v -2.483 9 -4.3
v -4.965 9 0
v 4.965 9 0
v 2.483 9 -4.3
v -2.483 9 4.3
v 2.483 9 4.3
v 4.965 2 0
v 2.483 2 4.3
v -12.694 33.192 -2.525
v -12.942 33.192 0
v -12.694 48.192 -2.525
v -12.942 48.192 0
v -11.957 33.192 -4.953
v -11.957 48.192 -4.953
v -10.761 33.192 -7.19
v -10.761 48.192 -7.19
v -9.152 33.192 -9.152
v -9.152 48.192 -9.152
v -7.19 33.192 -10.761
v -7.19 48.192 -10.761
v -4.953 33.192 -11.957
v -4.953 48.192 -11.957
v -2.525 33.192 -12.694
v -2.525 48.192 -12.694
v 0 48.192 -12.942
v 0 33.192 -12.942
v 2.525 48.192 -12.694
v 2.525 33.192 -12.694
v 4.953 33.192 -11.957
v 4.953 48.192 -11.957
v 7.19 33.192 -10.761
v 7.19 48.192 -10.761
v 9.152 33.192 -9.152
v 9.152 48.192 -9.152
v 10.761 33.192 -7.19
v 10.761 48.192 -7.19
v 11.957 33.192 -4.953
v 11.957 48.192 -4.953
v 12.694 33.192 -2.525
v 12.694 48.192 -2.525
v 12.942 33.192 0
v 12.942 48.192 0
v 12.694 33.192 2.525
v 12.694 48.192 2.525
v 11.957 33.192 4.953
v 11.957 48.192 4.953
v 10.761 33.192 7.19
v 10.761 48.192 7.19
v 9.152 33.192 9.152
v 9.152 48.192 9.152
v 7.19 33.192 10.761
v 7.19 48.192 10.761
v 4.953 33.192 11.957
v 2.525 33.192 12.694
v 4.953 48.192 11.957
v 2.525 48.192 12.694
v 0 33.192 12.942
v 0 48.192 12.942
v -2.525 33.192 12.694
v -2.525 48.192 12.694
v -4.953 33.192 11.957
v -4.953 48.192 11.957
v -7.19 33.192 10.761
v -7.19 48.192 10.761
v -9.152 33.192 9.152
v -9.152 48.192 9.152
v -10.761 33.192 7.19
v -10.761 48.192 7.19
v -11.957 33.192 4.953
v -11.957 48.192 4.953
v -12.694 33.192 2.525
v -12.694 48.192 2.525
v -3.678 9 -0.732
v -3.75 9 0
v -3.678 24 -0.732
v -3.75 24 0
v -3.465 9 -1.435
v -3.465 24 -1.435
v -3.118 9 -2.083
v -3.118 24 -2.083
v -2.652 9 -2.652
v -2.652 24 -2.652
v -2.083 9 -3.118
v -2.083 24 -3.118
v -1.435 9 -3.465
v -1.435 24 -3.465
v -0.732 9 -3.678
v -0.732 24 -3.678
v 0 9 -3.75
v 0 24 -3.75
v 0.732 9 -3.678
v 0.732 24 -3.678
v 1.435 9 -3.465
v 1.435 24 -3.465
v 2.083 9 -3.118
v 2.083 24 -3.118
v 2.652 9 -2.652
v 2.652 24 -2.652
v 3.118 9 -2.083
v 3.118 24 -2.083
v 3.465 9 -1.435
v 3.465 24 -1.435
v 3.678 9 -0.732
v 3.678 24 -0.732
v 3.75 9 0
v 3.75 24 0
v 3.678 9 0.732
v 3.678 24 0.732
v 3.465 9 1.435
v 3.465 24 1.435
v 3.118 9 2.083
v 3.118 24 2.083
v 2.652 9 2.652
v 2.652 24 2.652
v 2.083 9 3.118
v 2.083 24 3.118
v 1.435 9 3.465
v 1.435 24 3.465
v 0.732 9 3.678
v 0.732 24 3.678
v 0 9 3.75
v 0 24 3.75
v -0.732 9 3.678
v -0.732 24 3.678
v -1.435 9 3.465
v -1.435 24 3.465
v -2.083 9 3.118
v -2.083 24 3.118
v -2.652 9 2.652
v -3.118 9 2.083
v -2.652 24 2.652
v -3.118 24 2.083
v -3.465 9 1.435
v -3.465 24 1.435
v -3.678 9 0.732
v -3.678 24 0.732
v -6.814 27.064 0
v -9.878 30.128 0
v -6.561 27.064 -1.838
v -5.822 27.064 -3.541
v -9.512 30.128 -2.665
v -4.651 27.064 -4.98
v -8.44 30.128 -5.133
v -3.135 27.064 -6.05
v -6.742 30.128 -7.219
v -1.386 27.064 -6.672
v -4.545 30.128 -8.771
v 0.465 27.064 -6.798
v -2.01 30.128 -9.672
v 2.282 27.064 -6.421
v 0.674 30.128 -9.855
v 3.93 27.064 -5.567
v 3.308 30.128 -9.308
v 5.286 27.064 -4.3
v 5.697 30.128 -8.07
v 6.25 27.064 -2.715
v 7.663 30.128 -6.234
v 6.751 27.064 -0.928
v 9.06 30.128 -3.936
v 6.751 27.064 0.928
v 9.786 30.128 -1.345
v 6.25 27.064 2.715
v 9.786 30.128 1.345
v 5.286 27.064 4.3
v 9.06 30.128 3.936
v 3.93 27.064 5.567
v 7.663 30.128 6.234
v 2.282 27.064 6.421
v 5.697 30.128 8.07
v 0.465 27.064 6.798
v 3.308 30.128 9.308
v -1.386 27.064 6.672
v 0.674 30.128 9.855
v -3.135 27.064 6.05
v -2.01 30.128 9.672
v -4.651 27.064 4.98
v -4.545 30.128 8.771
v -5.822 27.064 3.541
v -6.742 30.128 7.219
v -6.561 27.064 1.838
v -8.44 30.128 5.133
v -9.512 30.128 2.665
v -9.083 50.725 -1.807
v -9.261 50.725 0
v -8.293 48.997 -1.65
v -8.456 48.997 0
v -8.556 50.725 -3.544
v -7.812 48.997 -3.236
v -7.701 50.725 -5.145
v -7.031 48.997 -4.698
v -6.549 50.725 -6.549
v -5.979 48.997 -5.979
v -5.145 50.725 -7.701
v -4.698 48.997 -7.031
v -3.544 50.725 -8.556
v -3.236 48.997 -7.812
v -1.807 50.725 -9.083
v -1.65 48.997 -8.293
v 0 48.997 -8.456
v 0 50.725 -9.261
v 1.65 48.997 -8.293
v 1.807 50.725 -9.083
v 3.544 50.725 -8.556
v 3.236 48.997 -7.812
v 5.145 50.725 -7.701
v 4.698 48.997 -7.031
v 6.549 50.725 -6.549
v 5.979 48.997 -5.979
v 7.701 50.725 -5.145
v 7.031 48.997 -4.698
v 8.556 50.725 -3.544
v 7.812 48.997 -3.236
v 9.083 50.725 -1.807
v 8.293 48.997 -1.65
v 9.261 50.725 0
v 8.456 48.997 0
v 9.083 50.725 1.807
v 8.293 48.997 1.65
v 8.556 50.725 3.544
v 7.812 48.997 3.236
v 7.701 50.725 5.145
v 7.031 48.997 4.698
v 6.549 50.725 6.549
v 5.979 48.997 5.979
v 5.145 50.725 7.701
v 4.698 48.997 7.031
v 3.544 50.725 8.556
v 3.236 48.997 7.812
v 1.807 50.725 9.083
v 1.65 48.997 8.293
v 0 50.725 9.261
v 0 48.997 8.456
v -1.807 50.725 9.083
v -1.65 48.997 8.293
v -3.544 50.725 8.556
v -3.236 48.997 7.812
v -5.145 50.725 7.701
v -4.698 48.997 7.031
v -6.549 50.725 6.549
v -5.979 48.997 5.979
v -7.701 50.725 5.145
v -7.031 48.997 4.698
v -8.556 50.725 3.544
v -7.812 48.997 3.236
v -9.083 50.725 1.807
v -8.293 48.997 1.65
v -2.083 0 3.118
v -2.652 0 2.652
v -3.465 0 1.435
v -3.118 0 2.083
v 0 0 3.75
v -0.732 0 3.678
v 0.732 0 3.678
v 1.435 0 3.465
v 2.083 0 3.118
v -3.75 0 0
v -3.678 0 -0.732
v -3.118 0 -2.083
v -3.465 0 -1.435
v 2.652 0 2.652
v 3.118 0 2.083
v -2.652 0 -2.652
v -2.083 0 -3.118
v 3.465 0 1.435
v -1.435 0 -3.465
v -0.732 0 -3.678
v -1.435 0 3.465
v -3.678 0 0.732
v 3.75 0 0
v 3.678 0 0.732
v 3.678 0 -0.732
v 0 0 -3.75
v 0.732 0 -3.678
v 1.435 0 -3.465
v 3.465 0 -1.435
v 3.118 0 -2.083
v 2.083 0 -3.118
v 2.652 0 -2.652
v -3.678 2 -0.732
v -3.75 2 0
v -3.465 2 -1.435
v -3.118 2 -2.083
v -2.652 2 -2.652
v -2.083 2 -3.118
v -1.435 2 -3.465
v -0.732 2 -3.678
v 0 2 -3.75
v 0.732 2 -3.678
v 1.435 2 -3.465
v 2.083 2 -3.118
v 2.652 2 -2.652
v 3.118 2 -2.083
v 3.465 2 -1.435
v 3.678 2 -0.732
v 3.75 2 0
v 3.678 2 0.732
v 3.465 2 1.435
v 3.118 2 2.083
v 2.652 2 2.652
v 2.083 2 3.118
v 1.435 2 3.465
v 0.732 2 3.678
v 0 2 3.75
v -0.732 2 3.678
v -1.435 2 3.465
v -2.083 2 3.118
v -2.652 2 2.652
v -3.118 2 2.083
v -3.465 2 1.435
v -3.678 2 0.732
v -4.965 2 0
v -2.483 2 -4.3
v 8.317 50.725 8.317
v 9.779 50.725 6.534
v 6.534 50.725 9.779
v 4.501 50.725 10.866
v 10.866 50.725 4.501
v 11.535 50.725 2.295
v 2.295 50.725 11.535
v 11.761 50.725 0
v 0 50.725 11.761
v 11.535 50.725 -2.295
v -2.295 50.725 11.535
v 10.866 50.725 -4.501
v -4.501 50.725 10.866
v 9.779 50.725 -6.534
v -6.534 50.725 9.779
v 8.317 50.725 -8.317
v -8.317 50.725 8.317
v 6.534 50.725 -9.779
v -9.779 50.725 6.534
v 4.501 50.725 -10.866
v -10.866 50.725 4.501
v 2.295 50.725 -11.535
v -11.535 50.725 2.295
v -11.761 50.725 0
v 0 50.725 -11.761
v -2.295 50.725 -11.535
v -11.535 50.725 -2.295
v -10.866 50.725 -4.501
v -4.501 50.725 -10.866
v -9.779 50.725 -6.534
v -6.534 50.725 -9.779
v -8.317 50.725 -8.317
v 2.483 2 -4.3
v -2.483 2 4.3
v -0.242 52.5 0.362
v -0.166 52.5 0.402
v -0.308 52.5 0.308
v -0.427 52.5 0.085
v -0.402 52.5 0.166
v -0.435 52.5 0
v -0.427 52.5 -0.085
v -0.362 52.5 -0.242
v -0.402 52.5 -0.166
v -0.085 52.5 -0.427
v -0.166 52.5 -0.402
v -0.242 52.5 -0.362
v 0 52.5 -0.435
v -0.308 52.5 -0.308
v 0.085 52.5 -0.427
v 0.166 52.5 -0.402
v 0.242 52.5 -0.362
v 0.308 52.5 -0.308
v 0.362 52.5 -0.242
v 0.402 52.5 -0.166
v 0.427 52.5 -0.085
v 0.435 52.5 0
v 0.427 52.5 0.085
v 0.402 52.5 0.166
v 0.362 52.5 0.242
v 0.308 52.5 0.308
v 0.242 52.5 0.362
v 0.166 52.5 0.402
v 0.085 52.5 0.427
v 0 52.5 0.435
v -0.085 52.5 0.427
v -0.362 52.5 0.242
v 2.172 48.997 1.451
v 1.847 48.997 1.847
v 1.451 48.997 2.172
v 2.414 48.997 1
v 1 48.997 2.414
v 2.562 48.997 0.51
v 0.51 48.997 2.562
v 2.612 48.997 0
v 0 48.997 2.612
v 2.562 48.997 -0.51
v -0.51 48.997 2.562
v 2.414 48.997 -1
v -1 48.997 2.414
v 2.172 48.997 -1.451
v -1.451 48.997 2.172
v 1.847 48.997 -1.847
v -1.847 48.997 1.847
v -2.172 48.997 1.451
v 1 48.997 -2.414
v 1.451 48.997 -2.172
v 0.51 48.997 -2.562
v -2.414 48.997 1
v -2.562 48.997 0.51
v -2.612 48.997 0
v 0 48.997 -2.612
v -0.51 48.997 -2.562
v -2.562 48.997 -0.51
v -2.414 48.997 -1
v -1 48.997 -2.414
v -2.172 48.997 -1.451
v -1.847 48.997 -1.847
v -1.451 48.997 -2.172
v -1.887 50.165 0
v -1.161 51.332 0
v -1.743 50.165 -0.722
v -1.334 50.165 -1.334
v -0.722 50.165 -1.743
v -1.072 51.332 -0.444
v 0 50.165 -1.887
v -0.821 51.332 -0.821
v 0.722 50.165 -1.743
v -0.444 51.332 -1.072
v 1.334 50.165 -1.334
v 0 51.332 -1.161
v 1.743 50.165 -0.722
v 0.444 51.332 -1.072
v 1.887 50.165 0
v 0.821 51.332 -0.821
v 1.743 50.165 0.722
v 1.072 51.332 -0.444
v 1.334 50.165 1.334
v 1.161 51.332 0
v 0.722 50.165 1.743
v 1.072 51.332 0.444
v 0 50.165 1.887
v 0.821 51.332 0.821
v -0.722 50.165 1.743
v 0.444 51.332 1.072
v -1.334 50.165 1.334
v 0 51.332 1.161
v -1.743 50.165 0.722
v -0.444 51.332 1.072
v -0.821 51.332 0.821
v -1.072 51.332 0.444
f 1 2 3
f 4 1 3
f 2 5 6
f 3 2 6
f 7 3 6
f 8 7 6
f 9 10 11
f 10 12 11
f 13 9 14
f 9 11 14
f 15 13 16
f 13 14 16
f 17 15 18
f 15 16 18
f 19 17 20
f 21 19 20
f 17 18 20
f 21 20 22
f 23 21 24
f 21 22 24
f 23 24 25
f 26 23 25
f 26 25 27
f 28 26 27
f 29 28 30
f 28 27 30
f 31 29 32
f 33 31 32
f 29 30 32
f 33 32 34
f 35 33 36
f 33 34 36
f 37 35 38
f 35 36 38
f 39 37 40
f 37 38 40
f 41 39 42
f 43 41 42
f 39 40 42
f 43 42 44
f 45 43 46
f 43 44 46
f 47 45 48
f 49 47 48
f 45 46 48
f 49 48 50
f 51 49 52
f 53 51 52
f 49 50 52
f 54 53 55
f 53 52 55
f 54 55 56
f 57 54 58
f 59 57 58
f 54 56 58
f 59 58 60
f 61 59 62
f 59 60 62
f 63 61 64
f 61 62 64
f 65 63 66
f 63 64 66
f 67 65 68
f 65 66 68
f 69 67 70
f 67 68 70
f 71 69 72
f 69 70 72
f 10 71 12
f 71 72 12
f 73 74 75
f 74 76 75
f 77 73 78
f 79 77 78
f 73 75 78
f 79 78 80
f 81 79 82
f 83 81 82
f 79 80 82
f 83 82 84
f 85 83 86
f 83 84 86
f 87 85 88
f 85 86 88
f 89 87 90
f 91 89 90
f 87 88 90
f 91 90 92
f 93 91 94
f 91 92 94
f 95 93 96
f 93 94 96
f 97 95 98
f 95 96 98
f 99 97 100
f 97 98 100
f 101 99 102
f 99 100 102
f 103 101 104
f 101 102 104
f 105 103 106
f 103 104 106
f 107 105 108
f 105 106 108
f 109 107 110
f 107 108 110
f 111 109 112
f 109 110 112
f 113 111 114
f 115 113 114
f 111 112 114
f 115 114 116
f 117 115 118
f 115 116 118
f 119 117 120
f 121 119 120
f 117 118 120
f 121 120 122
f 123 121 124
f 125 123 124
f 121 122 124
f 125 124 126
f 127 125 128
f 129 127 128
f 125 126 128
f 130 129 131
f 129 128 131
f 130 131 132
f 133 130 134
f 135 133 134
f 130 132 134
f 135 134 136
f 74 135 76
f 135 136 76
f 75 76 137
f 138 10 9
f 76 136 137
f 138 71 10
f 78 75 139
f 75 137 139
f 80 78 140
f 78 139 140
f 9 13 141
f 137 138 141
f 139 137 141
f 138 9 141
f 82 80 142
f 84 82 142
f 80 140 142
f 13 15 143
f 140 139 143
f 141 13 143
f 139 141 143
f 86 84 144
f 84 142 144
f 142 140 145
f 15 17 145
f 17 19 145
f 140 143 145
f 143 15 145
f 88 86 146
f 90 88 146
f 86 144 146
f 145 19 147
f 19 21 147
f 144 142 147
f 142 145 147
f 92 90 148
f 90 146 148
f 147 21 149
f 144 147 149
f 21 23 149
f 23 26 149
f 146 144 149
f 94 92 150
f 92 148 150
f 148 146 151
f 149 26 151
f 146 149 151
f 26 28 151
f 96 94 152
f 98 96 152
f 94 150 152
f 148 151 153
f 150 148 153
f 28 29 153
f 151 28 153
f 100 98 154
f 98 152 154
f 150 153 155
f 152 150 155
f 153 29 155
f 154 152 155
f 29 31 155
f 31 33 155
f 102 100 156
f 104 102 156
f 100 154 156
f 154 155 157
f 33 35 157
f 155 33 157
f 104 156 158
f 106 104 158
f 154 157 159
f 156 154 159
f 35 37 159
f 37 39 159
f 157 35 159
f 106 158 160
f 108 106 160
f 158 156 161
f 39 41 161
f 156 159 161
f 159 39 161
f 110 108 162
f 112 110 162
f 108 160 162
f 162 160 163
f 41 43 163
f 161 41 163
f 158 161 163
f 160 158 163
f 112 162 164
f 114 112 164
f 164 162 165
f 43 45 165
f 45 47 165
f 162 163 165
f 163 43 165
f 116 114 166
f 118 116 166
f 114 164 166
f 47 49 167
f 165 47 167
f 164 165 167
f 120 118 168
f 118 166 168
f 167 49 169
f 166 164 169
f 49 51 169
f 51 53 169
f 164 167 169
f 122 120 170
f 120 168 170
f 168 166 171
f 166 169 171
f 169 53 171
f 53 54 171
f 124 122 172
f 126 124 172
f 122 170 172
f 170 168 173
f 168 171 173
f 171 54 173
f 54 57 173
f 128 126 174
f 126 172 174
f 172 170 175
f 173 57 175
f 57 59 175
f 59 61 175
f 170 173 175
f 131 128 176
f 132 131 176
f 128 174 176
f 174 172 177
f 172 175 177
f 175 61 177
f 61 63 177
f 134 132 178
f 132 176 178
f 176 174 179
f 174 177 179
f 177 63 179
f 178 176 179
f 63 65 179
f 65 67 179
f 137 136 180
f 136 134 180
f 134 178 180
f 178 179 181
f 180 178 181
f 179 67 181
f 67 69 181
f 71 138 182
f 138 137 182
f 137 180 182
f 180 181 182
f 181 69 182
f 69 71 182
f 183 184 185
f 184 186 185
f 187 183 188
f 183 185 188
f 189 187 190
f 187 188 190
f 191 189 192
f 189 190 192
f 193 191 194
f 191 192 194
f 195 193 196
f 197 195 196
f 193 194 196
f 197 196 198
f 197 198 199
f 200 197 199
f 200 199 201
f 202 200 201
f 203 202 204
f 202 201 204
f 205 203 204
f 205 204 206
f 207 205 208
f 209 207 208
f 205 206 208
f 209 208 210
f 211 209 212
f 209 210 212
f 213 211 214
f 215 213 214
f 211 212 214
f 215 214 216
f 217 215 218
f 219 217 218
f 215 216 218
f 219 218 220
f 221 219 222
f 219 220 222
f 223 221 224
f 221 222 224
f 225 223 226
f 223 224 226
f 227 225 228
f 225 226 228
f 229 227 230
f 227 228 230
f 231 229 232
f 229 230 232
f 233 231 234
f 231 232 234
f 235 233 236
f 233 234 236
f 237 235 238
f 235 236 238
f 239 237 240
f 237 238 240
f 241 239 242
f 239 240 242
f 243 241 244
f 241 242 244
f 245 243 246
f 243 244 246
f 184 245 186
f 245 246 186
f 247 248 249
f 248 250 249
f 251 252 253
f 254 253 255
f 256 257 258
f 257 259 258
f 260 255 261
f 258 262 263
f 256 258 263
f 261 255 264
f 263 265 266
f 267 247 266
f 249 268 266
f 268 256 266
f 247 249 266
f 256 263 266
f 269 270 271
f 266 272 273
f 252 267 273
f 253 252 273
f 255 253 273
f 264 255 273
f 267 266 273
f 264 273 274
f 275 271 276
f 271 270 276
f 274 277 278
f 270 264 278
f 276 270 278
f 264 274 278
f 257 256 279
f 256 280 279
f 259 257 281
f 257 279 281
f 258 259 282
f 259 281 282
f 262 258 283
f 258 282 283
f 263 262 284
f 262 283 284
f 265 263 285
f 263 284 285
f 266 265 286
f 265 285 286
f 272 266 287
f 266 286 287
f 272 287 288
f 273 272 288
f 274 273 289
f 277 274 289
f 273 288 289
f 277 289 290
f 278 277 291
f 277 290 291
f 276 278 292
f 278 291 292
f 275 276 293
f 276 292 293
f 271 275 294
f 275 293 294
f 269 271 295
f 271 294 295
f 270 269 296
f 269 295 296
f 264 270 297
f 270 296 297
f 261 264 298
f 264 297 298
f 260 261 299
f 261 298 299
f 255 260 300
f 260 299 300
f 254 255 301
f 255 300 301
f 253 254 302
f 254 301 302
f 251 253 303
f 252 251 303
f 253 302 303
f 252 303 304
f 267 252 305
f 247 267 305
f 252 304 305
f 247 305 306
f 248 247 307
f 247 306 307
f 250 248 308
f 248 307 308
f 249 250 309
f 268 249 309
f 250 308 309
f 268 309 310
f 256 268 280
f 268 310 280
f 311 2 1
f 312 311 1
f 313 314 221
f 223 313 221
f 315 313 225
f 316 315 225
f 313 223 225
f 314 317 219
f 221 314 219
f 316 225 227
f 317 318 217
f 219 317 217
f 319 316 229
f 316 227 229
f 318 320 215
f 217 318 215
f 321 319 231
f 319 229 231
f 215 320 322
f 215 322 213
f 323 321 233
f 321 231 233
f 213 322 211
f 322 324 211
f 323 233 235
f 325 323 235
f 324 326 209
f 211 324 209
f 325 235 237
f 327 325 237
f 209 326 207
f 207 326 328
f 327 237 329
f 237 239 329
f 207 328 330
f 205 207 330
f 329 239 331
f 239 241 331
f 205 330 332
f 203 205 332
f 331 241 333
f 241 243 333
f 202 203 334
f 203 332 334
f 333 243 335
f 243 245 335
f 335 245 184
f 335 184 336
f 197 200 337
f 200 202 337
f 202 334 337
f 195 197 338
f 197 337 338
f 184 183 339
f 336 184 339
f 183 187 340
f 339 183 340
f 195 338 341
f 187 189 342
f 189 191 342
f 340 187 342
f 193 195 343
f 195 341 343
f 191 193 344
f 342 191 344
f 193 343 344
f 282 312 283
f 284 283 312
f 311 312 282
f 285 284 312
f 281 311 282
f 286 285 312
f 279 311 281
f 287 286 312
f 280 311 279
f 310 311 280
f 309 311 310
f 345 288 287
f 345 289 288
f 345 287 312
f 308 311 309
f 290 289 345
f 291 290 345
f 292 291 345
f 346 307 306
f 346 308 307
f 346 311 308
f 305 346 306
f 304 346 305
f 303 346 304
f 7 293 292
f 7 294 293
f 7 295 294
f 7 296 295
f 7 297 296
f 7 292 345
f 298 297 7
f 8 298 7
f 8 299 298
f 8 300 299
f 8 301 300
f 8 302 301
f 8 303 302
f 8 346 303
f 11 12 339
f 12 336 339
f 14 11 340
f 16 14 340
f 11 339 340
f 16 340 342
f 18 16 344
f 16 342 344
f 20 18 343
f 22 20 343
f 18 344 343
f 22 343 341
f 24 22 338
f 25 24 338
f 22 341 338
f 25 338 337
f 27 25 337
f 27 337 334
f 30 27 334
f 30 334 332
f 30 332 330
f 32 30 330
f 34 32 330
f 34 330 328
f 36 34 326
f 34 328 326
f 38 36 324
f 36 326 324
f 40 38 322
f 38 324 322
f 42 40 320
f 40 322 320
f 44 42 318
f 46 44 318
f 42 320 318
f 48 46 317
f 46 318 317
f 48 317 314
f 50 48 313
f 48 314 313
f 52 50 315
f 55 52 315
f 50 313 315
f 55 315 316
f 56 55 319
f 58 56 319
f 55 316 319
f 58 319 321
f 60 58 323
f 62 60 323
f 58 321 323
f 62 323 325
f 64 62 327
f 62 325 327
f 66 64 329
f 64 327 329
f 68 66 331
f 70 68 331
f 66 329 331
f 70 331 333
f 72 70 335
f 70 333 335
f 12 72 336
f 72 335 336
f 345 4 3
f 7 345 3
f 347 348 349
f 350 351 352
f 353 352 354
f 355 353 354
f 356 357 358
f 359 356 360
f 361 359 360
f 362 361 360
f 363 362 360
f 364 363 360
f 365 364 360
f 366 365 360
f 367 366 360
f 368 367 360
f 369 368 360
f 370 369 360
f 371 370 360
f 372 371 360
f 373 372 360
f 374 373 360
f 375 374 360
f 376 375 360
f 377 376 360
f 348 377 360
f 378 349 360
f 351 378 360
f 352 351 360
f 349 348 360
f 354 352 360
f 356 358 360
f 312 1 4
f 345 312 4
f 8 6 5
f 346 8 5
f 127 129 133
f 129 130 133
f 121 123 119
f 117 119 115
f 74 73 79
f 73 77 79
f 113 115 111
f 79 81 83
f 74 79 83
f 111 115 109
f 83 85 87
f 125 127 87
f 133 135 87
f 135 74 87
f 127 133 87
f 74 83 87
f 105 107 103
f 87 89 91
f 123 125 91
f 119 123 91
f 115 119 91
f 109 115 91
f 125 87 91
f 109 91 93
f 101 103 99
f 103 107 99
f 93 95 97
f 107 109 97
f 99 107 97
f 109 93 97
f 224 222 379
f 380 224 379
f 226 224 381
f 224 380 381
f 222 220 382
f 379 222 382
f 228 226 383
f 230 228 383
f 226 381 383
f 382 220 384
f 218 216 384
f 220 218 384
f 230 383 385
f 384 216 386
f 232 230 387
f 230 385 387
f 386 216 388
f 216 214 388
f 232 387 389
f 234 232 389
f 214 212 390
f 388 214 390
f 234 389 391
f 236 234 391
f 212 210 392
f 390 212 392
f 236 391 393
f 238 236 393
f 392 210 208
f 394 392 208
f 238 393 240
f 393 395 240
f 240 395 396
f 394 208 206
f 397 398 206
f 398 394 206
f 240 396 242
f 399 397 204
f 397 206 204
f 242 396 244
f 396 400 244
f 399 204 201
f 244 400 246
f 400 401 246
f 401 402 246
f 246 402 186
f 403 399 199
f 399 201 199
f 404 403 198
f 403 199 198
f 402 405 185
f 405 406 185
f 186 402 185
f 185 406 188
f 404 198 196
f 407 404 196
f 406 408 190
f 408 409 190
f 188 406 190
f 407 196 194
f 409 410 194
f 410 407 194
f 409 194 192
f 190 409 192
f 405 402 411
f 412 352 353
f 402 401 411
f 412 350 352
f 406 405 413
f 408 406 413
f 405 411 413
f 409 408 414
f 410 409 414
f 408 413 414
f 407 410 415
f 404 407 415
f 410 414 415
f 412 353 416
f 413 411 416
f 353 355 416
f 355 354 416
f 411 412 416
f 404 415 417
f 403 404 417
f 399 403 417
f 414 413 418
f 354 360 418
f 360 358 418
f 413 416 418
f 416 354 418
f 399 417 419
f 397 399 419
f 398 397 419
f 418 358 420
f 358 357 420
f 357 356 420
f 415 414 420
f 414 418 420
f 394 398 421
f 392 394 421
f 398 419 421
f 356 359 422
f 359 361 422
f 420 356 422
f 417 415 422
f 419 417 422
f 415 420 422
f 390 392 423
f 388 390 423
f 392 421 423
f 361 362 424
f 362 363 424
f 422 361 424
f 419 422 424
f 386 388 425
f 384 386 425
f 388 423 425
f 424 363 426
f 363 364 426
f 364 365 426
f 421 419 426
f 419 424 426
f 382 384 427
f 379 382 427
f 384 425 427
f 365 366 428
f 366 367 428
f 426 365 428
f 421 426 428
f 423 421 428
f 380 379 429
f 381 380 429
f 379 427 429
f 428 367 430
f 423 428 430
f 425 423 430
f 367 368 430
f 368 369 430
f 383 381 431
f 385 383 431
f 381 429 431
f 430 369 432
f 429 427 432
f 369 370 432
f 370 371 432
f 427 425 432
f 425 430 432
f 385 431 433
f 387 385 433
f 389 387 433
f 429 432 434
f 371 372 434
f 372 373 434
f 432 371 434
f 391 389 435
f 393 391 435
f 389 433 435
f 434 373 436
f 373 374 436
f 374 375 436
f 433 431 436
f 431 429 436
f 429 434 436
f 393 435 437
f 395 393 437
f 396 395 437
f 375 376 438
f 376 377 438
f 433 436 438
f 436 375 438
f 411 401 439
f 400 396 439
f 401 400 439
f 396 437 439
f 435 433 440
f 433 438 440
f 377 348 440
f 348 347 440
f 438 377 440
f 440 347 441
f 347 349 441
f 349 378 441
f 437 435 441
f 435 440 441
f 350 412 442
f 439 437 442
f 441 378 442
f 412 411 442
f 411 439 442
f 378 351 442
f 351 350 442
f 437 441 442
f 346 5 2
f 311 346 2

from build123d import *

# Parameters (mm, degrees)
SALIENTE_EXTRUIR1_START = -7
CROQUIS2_R              = 4.25
SALIENTE_EXTRUIR1_DEPTH = 7


# Read off the part's stored shape, not the designer's step: Partir1
with BuildPart() as part:
    # Croquis1 → Revolución1 (revolve)
    with BuildSketch(Plane.XY):
        Polygon((0, 0), (-3.75, 0), (-3.75, 2), (-4.25, 2), (-4.25, 9), (-3.75, 9), (-3.75, 24), (-12.942388155, 33.192388155), (-12.942388155, 48.192388155), (-11.761339552, 50.725155058), (-9.261339552, 50.725155058), (-8.455528943, 48.997088628), (-2.612378307, 48.997088628), (-0.434974261, 52.5), (0, 52.5), align=None)
    revolve(axis=Axis((0, 52.5, 0), (0, -1, 0)))

    # Croquis2 → Saliente-Extruir1 (add)
    with BuildSketch(Plane.XZ.offset(-2).offset(SALIENTE_EXTRUIR1_START)):
        Polygon((4.965212315, 0), (2.482606158, 4.3), (-2.482606158, 4.3), (-4.965212315, 0), (-2.482606158, -4.3), (2.482606158, -4.3), align=None)
        Circle(CROQUIS2_R, mode=Mode.SUBTRACT)
    extrude(amount=SALIENTE_EXTRUIR1_DEPTH)


with BuildPart() as body_2:
    # Partir1: the piece on the far side of the plane
    add(part.part)
    split(bisect_by=Plane(origin=(0, 9, 0), x_dir=(1, 0, 0), z_dir=(0, 1, 0)), keep=Keep.BOTTOM)


with BuildPart() as part_1:
    add(part.part)

    # Partir1
    split(bisect_by=Plane(origin=(0, 9, 0), x_dir=(1, 0, 0), z_dir=(0, 1, 0)), keep=Keep.TOP)


solid = Compound([body_2.part, part_1.part])
